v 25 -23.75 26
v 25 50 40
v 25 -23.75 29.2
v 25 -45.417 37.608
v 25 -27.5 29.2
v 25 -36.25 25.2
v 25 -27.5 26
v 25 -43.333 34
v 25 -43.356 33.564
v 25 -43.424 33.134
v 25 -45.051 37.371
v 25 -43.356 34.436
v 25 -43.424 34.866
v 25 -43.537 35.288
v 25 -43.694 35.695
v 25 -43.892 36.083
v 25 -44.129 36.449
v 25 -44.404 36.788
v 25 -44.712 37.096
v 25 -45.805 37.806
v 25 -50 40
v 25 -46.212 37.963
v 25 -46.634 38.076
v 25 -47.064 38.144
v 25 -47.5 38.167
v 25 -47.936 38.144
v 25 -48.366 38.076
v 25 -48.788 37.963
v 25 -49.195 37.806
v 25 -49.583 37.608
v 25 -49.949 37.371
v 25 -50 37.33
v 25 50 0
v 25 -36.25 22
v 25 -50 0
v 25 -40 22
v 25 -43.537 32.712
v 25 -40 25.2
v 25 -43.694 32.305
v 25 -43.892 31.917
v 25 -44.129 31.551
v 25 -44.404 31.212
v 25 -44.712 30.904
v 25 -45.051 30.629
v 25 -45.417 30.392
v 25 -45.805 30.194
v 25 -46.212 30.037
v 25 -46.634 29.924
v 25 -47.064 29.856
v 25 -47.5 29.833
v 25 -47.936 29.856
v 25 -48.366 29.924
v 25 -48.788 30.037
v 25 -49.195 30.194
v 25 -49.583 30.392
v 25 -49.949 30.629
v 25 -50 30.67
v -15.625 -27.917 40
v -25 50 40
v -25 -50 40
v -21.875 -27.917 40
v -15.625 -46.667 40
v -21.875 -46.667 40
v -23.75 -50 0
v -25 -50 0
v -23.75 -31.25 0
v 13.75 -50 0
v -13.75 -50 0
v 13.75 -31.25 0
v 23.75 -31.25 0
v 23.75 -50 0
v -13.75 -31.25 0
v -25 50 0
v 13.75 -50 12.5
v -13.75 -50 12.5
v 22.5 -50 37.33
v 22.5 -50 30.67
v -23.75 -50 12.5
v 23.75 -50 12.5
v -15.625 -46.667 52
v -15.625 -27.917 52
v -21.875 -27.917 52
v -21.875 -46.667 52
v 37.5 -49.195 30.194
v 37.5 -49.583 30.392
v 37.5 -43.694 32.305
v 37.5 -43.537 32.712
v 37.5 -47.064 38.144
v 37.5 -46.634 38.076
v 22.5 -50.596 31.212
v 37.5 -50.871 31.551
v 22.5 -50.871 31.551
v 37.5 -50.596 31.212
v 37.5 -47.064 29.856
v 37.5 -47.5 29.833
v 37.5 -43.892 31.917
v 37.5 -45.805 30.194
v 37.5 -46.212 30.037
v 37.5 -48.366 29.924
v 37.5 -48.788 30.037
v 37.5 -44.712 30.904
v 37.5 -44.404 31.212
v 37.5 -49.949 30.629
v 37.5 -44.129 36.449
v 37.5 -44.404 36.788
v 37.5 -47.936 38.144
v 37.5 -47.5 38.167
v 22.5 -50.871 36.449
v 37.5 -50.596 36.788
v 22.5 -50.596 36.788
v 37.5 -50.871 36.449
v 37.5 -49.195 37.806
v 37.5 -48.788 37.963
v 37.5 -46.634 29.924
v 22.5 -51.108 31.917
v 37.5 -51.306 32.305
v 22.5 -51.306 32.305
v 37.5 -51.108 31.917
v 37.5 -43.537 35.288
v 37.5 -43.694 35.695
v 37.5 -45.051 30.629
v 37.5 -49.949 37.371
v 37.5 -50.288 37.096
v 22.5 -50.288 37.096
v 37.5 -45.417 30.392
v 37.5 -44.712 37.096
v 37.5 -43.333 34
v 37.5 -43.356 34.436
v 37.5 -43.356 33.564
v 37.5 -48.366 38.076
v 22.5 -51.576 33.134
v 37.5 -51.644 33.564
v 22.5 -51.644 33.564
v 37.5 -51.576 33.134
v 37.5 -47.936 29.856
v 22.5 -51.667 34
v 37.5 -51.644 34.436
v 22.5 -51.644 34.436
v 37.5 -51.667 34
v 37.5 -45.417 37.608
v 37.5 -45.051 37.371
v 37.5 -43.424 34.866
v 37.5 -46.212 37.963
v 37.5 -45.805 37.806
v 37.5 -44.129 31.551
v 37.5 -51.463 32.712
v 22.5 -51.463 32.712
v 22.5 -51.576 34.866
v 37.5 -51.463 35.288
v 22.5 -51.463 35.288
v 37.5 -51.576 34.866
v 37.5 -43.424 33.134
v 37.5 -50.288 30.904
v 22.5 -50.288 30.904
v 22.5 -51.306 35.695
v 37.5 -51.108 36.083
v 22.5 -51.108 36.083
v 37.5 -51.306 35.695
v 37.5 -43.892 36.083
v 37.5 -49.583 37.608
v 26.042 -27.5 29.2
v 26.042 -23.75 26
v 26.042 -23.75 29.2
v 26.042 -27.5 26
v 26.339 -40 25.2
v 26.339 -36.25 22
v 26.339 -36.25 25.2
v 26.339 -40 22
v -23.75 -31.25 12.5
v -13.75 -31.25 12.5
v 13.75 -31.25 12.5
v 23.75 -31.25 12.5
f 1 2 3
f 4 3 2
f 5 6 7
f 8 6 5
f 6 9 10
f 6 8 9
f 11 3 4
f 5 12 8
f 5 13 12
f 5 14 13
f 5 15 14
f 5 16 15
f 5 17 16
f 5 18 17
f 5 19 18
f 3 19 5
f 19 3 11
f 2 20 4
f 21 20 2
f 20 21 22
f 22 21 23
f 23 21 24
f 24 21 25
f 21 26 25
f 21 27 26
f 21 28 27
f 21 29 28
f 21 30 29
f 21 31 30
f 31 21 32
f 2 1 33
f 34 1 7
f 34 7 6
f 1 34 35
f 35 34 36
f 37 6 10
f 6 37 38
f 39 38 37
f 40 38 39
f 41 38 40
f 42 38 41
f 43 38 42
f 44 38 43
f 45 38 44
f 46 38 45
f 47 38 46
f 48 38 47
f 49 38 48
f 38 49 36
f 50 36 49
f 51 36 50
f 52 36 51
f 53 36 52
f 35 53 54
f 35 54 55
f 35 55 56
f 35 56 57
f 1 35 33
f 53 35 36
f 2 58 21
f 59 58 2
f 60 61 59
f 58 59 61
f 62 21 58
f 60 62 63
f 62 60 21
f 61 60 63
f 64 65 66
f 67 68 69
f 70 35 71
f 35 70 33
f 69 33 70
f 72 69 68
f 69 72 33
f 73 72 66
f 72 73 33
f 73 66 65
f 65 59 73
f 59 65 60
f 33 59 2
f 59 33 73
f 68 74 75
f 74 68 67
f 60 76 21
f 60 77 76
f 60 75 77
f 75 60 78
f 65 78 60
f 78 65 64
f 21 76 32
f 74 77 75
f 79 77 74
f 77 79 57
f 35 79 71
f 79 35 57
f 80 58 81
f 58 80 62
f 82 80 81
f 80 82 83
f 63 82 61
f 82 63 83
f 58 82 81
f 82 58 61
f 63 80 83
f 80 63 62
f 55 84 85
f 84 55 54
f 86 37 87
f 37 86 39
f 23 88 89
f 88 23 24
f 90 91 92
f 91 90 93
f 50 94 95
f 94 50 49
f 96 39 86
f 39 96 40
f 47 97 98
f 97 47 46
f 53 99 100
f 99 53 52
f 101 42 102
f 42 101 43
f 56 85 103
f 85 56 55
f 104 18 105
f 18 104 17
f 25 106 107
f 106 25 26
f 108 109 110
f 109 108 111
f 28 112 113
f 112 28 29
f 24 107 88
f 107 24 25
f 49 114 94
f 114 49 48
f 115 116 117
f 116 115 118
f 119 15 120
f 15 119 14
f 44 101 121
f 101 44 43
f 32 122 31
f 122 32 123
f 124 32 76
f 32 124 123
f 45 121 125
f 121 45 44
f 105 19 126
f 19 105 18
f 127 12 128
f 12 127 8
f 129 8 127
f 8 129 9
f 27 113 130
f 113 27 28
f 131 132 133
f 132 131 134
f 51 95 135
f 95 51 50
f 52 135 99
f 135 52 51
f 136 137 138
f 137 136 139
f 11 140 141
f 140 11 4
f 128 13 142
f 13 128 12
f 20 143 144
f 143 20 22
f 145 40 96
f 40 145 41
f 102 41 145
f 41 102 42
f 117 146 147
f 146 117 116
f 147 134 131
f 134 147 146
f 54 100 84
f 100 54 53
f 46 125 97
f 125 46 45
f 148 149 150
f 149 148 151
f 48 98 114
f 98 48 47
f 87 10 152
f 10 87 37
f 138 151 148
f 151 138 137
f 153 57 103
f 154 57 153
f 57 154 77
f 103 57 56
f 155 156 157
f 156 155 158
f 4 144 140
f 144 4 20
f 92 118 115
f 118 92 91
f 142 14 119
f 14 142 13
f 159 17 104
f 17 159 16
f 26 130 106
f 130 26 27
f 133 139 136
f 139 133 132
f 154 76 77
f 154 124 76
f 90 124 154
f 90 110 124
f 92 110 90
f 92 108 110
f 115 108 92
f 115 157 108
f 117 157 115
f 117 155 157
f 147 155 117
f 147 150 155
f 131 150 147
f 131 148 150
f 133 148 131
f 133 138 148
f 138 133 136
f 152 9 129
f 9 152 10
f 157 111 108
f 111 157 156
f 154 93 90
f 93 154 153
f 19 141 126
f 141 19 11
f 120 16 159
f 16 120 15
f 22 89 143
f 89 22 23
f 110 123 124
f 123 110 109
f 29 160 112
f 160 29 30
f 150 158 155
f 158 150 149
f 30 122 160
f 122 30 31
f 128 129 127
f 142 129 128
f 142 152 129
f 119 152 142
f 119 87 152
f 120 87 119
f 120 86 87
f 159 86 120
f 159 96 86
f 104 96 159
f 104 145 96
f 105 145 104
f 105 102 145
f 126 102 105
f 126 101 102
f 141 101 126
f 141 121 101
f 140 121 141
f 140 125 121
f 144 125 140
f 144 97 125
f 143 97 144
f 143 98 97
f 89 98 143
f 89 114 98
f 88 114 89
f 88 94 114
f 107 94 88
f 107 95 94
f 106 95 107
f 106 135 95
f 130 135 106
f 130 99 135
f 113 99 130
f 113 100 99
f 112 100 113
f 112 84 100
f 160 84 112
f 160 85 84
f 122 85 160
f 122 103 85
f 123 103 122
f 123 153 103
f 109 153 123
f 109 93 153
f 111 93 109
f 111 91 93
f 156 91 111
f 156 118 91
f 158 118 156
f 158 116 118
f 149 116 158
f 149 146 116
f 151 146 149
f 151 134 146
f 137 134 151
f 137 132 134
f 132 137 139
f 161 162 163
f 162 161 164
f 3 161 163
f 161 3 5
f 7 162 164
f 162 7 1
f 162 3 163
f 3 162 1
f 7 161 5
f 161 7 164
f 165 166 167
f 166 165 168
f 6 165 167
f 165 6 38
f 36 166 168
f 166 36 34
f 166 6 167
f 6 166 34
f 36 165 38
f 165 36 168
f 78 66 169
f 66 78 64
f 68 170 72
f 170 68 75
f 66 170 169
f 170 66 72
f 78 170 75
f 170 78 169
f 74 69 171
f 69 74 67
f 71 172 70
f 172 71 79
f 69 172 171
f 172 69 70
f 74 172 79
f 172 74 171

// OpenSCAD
// Generated by CadMonkey
// Prompt: hey cadmonkey, create me a car
// Generated at: 2025-11-10 16:48:11

// Car Model in OpenSCAD

// Constants
car_width = 50;
car_length = 100;
car_height = 40;
wheel_diameter = 25;
wheel_width = 10;
body_thickness = 5;

// Function to create a wheel
module wheel() {
    cylinder(h = wheel_width, r = wheel_diameter / 2, $fn = 60);
}

// Main body
difference() {
    union() {
        // Main Body
        translate([-car_width/2, -car_length/2, 0])
            cube([car_width, car_length, car_height]);

        // Hood
        translate([-car_width/2 + car_width/8, -car_length/2 + car_length * 0.7/4, car_height*0.6])
            cube([car_width/4, car_length * 0.9/4, car_height*0.4]);
        
        // Roof
        translate([-car_width/2 + car_width/16, -car_length/2 + car_length * 0.1/3, car_height*0.95])
            cube([car_width/8, car_length * 0.75/4, car_height*0.35]);
        
        // Rear Window
        translate([car_width/2 - car_width/20, -car_length/2 + car_length * 0.05/2, car_height*0.85])
            rotate([0,90,0])
                cylinder(h=car_length * 0.15, r=car_width/12, $fn=60);

        // Side Mirrors
        translate([-car_width/2 + car_width/32, -car_length/2 + car_length * 0.45/2, car_height*0.65])
          cube([car_width/16, car_length * 0.15/4, car_height*0.08]);
        
        translate([car_width/2 - car_width/24, -car_length/2 + car_length * 0.45/2, car_height*0.65])
          cube([car_width/16, car_length * 0.15/4, car_height*0.08]);

        // Headlights
        translate([-car_width/2 + car_width/32, -car_length/2 + car_length * 0.2/2, car_height*0.55])
           cube([car_width/16, car_length * 0.15/4, car_height*0.08]);
        
        translate([car_width/2 - car_width/28, -car_length/2 + car_length * 0.2/2, car_height*0.55])
             cube([car_width/16, car_length * 0.15/4, car_height*0.08]);
            
    }

    // Wheel Cutouts
    translate([-car_width/2 + wheel_diameter/4, -car_length/2 + wheel_diameter/4, 0])
      rotate([90,0,0]) {
        cube([wheel_width, wheel_diameter, wheel_diameter], center=true);
      }
    
    translate([car_width/2 - wheel_diameter/4, -car_length/2 + wheel_diameter/4, 0])
      rotate([90,0,0]) {
        cube([wheel_width, wheel_diameter, wheel_diameter], center=true);
      }
}
